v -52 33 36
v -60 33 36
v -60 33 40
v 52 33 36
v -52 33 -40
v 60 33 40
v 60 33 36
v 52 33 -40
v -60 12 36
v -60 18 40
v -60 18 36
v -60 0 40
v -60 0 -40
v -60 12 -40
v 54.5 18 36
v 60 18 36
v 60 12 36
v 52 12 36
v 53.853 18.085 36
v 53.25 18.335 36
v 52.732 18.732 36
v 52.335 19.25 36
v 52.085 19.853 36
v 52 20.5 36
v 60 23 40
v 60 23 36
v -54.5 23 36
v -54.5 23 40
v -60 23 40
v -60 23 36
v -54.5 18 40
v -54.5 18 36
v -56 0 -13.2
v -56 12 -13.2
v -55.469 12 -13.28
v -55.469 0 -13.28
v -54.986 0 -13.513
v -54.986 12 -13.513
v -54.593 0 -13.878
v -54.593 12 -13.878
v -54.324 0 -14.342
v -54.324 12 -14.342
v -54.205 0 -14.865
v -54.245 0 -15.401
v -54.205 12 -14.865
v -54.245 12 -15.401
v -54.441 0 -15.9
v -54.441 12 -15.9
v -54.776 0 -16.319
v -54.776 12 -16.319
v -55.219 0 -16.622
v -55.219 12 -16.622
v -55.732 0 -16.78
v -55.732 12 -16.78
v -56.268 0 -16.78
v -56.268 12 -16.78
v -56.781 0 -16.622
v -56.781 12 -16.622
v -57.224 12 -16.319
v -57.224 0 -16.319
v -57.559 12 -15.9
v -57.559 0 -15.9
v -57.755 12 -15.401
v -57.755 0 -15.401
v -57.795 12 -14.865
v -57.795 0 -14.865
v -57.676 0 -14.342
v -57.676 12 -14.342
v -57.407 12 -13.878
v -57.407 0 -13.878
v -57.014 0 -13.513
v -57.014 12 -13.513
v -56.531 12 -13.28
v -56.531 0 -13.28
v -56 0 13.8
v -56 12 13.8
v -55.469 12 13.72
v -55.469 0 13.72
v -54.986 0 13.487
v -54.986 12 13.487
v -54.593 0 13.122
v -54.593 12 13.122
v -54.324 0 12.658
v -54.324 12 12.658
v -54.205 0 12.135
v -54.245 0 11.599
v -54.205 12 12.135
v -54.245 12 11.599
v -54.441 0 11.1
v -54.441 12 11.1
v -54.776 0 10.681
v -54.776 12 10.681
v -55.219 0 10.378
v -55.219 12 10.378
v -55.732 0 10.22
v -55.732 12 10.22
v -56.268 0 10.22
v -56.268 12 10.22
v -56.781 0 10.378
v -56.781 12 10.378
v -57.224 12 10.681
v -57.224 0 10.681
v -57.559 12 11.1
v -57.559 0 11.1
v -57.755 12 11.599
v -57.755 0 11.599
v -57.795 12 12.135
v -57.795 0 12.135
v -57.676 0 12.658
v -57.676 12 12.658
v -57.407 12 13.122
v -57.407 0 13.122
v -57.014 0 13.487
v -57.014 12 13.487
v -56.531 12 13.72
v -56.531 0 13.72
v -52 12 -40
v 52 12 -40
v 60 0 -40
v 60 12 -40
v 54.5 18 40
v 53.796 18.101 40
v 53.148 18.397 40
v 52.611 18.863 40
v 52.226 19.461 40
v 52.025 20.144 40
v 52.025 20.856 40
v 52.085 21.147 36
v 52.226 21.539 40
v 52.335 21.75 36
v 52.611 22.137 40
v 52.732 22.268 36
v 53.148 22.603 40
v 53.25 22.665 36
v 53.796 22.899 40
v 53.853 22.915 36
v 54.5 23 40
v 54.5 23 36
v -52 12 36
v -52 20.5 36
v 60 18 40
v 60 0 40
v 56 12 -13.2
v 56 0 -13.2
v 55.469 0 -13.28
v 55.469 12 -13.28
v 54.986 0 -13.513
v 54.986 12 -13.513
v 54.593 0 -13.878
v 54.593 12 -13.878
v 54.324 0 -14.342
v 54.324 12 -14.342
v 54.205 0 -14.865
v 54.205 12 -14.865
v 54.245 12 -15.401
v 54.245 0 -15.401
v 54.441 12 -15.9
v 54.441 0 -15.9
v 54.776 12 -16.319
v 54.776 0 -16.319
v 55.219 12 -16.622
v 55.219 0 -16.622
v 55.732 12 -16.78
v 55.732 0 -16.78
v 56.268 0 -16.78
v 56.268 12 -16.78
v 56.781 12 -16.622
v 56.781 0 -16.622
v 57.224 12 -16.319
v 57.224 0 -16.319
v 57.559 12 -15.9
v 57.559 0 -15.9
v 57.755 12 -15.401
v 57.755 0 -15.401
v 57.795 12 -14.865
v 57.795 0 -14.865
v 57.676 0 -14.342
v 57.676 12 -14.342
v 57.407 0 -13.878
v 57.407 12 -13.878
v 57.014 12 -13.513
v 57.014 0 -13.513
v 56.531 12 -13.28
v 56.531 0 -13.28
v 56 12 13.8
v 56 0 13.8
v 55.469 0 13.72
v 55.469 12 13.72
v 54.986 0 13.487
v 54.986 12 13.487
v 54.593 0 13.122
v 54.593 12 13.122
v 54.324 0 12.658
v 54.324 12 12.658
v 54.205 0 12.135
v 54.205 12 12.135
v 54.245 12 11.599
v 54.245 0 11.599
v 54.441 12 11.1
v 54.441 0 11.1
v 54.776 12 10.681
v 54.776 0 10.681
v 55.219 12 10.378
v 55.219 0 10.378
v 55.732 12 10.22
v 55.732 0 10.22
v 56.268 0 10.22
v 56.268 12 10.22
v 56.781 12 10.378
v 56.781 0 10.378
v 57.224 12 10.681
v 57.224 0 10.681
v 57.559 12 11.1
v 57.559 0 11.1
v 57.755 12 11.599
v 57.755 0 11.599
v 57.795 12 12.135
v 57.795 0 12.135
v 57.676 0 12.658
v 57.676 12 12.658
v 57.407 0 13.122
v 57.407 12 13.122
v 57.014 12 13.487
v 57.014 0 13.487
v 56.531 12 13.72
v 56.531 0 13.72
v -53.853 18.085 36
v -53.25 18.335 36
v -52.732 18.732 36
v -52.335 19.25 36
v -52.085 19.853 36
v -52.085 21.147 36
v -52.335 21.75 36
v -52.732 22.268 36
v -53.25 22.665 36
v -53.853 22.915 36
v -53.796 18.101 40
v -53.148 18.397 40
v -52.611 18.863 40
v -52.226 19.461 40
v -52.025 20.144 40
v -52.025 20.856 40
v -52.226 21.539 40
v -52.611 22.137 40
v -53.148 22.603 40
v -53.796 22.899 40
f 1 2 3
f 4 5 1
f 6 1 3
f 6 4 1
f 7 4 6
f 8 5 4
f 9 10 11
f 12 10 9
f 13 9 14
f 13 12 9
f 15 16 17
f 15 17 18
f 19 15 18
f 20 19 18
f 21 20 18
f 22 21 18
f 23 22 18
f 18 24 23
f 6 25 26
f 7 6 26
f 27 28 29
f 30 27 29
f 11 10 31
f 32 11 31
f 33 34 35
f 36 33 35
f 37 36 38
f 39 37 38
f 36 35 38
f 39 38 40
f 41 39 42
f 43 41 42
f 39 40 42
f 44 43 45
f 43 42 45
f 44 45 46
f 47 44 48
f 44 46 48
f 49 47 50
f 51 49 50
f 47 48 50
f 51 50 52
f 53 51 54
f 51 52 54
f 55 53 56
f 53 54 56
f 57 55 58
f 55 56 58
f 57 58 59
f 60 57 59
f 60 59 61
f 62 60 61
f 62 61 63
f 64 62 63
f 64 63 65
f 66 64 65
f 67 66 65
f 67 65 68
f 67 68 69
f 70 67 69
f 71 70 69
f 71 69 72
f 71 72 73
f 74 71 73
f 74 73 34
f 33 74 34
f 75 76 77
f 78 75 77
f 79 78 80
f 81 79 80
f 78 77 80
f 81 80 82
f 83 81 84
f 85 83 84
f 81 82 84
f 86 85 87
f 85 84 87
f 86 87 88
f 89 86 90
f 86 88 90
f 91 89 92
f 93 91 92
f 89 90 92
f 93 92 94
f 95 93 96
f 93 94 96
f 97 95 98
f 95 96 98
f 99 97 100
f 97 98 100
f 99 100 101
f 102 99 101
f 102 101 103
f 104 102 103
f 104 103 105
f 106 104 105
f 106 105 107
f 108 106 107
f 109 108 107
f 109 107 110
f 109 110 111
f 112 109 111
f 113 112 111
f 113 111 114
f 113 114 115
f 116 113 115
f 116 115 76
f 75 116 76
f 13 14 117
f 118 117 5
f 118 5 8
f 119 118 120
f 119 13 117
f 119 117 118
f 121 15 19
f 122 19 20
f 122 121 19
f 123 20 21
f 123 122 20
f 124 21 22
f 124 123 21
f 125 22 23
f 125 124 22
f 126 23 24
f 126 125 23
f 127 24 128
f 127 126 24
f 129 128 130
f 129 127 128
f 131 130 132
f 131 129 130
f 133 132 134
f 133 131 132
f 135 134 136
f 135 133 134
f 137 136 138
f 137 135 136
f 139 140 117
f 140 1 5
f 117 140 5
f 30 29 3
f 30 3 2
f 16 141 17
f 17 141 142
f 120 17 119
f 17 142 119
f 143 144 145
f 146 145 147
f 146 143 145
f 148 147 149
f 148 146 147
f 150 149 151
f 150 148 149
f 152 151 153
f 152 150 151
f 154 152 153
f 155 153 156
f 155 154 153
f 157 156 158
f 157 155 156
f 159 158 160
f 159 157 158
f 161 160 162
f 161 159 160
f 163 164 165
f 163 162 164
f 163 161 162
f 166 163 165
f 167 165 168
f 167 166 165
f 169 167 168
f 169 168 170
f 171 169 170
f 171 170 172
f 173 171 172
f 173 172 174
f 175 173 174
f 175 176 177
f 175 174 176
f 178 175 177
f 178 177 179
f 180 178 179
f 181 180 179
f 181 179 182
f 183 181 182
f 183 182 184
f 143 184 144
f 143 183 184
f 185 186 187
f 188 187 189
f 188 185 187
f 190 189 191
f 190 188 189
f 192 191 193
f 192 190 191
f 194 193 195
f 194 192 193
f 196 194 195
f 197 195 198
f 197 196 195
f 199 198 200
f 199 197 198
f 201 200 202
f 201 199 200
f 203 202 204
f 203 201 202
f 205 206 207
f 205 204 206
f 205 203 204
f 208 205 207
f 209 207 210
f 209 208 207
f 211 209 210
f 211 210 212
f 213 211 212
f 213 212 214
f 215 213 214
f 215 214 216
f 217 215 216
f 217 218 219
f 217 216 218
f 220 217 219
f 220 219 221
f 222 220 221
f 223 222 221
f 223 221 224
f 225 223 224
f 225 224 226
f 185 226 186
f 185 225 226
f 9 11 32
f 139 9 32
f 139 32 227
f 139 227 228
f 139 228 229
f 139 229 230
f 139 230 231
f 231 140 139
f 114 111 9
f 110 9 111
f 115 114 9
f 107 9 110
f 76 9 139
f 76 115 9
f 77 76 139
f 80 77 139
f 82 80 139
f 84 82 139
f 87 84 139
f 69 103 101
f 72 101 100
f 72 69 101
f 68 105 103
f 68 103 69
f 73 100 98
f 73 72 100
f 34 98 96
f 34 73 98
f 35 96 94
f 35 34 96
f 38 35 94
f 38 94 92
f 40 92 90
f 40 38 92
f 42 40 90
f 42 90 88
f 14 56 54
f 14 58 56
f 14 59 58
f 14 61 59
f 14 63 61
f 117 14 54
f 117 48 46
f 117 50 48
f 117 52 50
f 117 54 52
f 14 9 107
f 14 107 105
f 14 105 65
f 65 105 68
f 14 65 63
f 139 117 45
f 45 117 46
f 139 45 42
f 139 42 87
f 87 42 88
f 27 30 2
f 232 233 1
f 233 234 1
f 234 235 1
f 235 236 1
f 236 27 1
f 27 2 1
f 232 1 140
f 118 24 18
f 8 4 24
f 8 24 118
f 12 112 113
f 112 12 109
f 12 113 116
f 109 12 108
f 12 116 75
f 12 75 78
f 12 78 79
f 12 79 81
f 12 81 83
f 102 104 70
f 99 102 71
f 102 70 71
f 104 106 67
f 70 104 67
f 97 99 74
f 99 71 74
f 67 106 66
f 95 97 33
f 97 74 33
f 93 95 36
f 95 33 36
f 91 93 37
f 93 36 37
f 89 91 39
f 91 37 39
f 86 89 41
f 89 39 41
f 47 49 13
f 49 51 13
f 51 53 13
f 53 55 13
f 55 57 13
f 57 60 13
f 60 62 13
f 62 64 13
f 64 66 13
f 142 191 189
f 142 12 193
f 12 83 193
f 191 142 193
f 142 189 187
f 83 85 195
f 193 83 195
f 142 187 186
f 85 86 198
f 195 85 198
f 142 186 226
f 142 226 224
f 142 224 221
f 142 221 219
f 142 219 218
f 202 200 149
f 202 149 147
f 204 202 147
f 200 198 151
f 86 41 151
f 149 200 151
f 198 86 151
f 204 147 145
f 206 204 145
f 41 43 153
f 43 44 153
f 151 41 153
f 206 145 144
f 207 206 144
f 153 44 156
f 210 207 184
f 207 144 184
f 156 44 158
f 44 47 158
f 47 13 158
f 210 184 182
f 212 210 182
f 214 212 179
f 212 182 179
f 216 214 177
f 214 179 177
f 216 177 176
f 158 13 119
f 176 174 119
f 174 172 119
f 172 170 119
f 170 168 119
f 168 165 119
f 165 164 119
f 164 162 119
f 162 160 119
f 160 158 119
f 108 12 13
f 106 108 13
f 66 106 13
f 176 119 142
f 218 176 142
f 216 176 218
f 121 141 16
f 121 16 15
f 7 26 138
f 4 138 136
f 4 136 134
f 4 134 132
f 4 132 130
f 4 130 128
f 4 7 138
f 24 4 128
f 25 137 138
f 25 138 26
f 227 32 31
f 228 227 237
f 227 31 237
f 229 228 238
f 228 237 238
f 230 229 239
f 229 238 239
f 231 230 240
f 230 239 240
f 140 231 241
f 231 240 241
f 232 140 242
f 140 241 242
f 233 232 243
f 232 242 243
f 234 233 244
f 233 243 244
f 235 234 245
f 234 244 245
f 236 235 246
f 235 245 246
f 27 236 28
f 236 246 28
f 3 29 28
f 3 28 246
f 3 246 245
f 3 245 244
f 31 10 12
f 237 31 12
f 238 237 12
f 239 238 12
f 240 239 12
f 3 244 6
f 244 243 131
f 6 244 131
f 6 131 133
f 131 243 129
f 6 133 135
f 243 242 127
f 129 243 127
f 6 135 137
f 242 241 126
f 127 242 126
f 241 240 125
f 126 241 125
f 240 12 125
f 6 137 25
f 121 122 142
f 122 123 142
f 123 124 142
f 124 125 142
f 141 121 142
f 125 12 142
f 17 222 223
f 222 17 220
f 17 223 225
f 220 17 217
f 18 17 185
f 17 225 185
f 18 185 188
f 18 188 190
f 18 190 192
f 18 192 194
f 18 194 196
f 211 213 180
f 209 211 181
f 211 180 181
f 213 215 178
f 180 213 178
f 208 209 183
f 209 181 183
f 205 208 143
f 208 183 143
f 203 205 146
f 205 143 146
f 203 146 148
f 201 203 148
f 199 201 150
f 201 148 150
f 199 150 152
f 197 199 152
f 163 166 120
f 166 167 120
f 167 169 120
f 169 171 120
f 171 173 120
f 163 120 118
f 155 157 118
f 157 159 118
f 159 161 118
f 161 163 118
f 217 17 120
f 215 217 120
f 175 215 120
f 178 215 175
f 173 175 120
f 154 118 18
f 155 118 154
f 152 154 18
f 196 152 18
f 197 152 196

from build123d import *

# Parameters (mm, degrees)
SKETCH1_W           = 120
SKETCH1_H           = 80
BOSS_EXTRUDE1_DEPTH = 33
SKETCH2_W           = 8
SKETCH2_H           = 76
CUT_EXTRUDE1_DEPTH  = 21
SKETCH3_R           = 1.8
CUT_EXTRUDE2_DEPTH  = 76.106590923
SKETCH4_R           = 2.5
CUT_EXTRUDE3_DEPTH  = 106.304320899


with BuildPart() as part:
    # Sketch1 → Boss-Extrude1 (new body)
    with BuildSketch(Plane(origin=(0, 0, 0), x_dir=(1, 0, 0), z_dir=(0, 1, 0))):
        Rectangle(SKETCH1_W, SKETCH1_H)
    extrude(amount=BOSS_EXTRUDE1_DEPTH)

    # Sketch2 → Cut-Extrude1 (cut)
    with BuildSketch(Plane(origin=(0, 33, 0), x_dir=(1, 0, 0), z_dir=(0, 1, 0))):
        with Locations((-56, 2)):
            Rectangle(SKETCH2_W, SKETCH2_H)
    cut_extrude1 = extrude(amount=-CUT_EXTRUDE1_DEPTH, mode=Mode.SUBTRACT)

    # Sketch3 → Cut-Extrude2 (cut, through all)
    with BuildSketch(Plane(origin=(0, 12, 0), x_dir=(1, 0, 0), z_dir=(0, 1, 0))):
        with Locations(Location((-56, 15, 0), (0, 0, 270))):
            Circle(SKETCH3_R)
        with Locations(Location((-56, -12, 0), (0, 0, 270))):
            Circle(SKETCH3_R)
    cut_extrude2 = extrude(amount=-CUT_EXTRUDE2_DEPTH, mode=Mode.SUBTRACT)

    # Sketch4 → Cut-Extrude3 (cut, through all)
    with BuildSketch(Plane.XY.offset(40)):
        with Locations((-54.5, 20.5)):
            Circle(SKETCH4_R)
        with BuildLine():
            Line((-54.5, 23), (-60, 23))
            Line((-60, 23), (-60, 18))
            Line((-60, 18), (-54.5, 18))
            ThreePointArc((-54.5, 18), (-57, 20.5), (-54.5, 23))
        make_face()
    cut_extrude3 = extrude(amount=-CUT_EXTRUDE3_DEPTH, mode=Mode.SUBTRACT)

    # Mirror1: Cut-Extrude1, Cut-Extrude2, Cut-Extrude3 across plane
    add(cut_extrude1.mirror(Plane(origin=(0, 0, 0), x_dir=(0, 0, 1), z_dir=(1, 0, 0))), mode=Mode.SUBTRACT)
    add(cut_extrude2.mirror(Plane(origin=(0, 0, 0), x_dir=(0, 0, 1), z_dir=(1, 0, 0))), mode=Mode.SUBTRACT)
    add(cut_extrude3.mirror(Plane(origin=(0, 0, 0), x_dir=(0, 0, 1), z_dir=(1, 0, 0))), mode=Mode.SUBTRACT)


solid = part.part
